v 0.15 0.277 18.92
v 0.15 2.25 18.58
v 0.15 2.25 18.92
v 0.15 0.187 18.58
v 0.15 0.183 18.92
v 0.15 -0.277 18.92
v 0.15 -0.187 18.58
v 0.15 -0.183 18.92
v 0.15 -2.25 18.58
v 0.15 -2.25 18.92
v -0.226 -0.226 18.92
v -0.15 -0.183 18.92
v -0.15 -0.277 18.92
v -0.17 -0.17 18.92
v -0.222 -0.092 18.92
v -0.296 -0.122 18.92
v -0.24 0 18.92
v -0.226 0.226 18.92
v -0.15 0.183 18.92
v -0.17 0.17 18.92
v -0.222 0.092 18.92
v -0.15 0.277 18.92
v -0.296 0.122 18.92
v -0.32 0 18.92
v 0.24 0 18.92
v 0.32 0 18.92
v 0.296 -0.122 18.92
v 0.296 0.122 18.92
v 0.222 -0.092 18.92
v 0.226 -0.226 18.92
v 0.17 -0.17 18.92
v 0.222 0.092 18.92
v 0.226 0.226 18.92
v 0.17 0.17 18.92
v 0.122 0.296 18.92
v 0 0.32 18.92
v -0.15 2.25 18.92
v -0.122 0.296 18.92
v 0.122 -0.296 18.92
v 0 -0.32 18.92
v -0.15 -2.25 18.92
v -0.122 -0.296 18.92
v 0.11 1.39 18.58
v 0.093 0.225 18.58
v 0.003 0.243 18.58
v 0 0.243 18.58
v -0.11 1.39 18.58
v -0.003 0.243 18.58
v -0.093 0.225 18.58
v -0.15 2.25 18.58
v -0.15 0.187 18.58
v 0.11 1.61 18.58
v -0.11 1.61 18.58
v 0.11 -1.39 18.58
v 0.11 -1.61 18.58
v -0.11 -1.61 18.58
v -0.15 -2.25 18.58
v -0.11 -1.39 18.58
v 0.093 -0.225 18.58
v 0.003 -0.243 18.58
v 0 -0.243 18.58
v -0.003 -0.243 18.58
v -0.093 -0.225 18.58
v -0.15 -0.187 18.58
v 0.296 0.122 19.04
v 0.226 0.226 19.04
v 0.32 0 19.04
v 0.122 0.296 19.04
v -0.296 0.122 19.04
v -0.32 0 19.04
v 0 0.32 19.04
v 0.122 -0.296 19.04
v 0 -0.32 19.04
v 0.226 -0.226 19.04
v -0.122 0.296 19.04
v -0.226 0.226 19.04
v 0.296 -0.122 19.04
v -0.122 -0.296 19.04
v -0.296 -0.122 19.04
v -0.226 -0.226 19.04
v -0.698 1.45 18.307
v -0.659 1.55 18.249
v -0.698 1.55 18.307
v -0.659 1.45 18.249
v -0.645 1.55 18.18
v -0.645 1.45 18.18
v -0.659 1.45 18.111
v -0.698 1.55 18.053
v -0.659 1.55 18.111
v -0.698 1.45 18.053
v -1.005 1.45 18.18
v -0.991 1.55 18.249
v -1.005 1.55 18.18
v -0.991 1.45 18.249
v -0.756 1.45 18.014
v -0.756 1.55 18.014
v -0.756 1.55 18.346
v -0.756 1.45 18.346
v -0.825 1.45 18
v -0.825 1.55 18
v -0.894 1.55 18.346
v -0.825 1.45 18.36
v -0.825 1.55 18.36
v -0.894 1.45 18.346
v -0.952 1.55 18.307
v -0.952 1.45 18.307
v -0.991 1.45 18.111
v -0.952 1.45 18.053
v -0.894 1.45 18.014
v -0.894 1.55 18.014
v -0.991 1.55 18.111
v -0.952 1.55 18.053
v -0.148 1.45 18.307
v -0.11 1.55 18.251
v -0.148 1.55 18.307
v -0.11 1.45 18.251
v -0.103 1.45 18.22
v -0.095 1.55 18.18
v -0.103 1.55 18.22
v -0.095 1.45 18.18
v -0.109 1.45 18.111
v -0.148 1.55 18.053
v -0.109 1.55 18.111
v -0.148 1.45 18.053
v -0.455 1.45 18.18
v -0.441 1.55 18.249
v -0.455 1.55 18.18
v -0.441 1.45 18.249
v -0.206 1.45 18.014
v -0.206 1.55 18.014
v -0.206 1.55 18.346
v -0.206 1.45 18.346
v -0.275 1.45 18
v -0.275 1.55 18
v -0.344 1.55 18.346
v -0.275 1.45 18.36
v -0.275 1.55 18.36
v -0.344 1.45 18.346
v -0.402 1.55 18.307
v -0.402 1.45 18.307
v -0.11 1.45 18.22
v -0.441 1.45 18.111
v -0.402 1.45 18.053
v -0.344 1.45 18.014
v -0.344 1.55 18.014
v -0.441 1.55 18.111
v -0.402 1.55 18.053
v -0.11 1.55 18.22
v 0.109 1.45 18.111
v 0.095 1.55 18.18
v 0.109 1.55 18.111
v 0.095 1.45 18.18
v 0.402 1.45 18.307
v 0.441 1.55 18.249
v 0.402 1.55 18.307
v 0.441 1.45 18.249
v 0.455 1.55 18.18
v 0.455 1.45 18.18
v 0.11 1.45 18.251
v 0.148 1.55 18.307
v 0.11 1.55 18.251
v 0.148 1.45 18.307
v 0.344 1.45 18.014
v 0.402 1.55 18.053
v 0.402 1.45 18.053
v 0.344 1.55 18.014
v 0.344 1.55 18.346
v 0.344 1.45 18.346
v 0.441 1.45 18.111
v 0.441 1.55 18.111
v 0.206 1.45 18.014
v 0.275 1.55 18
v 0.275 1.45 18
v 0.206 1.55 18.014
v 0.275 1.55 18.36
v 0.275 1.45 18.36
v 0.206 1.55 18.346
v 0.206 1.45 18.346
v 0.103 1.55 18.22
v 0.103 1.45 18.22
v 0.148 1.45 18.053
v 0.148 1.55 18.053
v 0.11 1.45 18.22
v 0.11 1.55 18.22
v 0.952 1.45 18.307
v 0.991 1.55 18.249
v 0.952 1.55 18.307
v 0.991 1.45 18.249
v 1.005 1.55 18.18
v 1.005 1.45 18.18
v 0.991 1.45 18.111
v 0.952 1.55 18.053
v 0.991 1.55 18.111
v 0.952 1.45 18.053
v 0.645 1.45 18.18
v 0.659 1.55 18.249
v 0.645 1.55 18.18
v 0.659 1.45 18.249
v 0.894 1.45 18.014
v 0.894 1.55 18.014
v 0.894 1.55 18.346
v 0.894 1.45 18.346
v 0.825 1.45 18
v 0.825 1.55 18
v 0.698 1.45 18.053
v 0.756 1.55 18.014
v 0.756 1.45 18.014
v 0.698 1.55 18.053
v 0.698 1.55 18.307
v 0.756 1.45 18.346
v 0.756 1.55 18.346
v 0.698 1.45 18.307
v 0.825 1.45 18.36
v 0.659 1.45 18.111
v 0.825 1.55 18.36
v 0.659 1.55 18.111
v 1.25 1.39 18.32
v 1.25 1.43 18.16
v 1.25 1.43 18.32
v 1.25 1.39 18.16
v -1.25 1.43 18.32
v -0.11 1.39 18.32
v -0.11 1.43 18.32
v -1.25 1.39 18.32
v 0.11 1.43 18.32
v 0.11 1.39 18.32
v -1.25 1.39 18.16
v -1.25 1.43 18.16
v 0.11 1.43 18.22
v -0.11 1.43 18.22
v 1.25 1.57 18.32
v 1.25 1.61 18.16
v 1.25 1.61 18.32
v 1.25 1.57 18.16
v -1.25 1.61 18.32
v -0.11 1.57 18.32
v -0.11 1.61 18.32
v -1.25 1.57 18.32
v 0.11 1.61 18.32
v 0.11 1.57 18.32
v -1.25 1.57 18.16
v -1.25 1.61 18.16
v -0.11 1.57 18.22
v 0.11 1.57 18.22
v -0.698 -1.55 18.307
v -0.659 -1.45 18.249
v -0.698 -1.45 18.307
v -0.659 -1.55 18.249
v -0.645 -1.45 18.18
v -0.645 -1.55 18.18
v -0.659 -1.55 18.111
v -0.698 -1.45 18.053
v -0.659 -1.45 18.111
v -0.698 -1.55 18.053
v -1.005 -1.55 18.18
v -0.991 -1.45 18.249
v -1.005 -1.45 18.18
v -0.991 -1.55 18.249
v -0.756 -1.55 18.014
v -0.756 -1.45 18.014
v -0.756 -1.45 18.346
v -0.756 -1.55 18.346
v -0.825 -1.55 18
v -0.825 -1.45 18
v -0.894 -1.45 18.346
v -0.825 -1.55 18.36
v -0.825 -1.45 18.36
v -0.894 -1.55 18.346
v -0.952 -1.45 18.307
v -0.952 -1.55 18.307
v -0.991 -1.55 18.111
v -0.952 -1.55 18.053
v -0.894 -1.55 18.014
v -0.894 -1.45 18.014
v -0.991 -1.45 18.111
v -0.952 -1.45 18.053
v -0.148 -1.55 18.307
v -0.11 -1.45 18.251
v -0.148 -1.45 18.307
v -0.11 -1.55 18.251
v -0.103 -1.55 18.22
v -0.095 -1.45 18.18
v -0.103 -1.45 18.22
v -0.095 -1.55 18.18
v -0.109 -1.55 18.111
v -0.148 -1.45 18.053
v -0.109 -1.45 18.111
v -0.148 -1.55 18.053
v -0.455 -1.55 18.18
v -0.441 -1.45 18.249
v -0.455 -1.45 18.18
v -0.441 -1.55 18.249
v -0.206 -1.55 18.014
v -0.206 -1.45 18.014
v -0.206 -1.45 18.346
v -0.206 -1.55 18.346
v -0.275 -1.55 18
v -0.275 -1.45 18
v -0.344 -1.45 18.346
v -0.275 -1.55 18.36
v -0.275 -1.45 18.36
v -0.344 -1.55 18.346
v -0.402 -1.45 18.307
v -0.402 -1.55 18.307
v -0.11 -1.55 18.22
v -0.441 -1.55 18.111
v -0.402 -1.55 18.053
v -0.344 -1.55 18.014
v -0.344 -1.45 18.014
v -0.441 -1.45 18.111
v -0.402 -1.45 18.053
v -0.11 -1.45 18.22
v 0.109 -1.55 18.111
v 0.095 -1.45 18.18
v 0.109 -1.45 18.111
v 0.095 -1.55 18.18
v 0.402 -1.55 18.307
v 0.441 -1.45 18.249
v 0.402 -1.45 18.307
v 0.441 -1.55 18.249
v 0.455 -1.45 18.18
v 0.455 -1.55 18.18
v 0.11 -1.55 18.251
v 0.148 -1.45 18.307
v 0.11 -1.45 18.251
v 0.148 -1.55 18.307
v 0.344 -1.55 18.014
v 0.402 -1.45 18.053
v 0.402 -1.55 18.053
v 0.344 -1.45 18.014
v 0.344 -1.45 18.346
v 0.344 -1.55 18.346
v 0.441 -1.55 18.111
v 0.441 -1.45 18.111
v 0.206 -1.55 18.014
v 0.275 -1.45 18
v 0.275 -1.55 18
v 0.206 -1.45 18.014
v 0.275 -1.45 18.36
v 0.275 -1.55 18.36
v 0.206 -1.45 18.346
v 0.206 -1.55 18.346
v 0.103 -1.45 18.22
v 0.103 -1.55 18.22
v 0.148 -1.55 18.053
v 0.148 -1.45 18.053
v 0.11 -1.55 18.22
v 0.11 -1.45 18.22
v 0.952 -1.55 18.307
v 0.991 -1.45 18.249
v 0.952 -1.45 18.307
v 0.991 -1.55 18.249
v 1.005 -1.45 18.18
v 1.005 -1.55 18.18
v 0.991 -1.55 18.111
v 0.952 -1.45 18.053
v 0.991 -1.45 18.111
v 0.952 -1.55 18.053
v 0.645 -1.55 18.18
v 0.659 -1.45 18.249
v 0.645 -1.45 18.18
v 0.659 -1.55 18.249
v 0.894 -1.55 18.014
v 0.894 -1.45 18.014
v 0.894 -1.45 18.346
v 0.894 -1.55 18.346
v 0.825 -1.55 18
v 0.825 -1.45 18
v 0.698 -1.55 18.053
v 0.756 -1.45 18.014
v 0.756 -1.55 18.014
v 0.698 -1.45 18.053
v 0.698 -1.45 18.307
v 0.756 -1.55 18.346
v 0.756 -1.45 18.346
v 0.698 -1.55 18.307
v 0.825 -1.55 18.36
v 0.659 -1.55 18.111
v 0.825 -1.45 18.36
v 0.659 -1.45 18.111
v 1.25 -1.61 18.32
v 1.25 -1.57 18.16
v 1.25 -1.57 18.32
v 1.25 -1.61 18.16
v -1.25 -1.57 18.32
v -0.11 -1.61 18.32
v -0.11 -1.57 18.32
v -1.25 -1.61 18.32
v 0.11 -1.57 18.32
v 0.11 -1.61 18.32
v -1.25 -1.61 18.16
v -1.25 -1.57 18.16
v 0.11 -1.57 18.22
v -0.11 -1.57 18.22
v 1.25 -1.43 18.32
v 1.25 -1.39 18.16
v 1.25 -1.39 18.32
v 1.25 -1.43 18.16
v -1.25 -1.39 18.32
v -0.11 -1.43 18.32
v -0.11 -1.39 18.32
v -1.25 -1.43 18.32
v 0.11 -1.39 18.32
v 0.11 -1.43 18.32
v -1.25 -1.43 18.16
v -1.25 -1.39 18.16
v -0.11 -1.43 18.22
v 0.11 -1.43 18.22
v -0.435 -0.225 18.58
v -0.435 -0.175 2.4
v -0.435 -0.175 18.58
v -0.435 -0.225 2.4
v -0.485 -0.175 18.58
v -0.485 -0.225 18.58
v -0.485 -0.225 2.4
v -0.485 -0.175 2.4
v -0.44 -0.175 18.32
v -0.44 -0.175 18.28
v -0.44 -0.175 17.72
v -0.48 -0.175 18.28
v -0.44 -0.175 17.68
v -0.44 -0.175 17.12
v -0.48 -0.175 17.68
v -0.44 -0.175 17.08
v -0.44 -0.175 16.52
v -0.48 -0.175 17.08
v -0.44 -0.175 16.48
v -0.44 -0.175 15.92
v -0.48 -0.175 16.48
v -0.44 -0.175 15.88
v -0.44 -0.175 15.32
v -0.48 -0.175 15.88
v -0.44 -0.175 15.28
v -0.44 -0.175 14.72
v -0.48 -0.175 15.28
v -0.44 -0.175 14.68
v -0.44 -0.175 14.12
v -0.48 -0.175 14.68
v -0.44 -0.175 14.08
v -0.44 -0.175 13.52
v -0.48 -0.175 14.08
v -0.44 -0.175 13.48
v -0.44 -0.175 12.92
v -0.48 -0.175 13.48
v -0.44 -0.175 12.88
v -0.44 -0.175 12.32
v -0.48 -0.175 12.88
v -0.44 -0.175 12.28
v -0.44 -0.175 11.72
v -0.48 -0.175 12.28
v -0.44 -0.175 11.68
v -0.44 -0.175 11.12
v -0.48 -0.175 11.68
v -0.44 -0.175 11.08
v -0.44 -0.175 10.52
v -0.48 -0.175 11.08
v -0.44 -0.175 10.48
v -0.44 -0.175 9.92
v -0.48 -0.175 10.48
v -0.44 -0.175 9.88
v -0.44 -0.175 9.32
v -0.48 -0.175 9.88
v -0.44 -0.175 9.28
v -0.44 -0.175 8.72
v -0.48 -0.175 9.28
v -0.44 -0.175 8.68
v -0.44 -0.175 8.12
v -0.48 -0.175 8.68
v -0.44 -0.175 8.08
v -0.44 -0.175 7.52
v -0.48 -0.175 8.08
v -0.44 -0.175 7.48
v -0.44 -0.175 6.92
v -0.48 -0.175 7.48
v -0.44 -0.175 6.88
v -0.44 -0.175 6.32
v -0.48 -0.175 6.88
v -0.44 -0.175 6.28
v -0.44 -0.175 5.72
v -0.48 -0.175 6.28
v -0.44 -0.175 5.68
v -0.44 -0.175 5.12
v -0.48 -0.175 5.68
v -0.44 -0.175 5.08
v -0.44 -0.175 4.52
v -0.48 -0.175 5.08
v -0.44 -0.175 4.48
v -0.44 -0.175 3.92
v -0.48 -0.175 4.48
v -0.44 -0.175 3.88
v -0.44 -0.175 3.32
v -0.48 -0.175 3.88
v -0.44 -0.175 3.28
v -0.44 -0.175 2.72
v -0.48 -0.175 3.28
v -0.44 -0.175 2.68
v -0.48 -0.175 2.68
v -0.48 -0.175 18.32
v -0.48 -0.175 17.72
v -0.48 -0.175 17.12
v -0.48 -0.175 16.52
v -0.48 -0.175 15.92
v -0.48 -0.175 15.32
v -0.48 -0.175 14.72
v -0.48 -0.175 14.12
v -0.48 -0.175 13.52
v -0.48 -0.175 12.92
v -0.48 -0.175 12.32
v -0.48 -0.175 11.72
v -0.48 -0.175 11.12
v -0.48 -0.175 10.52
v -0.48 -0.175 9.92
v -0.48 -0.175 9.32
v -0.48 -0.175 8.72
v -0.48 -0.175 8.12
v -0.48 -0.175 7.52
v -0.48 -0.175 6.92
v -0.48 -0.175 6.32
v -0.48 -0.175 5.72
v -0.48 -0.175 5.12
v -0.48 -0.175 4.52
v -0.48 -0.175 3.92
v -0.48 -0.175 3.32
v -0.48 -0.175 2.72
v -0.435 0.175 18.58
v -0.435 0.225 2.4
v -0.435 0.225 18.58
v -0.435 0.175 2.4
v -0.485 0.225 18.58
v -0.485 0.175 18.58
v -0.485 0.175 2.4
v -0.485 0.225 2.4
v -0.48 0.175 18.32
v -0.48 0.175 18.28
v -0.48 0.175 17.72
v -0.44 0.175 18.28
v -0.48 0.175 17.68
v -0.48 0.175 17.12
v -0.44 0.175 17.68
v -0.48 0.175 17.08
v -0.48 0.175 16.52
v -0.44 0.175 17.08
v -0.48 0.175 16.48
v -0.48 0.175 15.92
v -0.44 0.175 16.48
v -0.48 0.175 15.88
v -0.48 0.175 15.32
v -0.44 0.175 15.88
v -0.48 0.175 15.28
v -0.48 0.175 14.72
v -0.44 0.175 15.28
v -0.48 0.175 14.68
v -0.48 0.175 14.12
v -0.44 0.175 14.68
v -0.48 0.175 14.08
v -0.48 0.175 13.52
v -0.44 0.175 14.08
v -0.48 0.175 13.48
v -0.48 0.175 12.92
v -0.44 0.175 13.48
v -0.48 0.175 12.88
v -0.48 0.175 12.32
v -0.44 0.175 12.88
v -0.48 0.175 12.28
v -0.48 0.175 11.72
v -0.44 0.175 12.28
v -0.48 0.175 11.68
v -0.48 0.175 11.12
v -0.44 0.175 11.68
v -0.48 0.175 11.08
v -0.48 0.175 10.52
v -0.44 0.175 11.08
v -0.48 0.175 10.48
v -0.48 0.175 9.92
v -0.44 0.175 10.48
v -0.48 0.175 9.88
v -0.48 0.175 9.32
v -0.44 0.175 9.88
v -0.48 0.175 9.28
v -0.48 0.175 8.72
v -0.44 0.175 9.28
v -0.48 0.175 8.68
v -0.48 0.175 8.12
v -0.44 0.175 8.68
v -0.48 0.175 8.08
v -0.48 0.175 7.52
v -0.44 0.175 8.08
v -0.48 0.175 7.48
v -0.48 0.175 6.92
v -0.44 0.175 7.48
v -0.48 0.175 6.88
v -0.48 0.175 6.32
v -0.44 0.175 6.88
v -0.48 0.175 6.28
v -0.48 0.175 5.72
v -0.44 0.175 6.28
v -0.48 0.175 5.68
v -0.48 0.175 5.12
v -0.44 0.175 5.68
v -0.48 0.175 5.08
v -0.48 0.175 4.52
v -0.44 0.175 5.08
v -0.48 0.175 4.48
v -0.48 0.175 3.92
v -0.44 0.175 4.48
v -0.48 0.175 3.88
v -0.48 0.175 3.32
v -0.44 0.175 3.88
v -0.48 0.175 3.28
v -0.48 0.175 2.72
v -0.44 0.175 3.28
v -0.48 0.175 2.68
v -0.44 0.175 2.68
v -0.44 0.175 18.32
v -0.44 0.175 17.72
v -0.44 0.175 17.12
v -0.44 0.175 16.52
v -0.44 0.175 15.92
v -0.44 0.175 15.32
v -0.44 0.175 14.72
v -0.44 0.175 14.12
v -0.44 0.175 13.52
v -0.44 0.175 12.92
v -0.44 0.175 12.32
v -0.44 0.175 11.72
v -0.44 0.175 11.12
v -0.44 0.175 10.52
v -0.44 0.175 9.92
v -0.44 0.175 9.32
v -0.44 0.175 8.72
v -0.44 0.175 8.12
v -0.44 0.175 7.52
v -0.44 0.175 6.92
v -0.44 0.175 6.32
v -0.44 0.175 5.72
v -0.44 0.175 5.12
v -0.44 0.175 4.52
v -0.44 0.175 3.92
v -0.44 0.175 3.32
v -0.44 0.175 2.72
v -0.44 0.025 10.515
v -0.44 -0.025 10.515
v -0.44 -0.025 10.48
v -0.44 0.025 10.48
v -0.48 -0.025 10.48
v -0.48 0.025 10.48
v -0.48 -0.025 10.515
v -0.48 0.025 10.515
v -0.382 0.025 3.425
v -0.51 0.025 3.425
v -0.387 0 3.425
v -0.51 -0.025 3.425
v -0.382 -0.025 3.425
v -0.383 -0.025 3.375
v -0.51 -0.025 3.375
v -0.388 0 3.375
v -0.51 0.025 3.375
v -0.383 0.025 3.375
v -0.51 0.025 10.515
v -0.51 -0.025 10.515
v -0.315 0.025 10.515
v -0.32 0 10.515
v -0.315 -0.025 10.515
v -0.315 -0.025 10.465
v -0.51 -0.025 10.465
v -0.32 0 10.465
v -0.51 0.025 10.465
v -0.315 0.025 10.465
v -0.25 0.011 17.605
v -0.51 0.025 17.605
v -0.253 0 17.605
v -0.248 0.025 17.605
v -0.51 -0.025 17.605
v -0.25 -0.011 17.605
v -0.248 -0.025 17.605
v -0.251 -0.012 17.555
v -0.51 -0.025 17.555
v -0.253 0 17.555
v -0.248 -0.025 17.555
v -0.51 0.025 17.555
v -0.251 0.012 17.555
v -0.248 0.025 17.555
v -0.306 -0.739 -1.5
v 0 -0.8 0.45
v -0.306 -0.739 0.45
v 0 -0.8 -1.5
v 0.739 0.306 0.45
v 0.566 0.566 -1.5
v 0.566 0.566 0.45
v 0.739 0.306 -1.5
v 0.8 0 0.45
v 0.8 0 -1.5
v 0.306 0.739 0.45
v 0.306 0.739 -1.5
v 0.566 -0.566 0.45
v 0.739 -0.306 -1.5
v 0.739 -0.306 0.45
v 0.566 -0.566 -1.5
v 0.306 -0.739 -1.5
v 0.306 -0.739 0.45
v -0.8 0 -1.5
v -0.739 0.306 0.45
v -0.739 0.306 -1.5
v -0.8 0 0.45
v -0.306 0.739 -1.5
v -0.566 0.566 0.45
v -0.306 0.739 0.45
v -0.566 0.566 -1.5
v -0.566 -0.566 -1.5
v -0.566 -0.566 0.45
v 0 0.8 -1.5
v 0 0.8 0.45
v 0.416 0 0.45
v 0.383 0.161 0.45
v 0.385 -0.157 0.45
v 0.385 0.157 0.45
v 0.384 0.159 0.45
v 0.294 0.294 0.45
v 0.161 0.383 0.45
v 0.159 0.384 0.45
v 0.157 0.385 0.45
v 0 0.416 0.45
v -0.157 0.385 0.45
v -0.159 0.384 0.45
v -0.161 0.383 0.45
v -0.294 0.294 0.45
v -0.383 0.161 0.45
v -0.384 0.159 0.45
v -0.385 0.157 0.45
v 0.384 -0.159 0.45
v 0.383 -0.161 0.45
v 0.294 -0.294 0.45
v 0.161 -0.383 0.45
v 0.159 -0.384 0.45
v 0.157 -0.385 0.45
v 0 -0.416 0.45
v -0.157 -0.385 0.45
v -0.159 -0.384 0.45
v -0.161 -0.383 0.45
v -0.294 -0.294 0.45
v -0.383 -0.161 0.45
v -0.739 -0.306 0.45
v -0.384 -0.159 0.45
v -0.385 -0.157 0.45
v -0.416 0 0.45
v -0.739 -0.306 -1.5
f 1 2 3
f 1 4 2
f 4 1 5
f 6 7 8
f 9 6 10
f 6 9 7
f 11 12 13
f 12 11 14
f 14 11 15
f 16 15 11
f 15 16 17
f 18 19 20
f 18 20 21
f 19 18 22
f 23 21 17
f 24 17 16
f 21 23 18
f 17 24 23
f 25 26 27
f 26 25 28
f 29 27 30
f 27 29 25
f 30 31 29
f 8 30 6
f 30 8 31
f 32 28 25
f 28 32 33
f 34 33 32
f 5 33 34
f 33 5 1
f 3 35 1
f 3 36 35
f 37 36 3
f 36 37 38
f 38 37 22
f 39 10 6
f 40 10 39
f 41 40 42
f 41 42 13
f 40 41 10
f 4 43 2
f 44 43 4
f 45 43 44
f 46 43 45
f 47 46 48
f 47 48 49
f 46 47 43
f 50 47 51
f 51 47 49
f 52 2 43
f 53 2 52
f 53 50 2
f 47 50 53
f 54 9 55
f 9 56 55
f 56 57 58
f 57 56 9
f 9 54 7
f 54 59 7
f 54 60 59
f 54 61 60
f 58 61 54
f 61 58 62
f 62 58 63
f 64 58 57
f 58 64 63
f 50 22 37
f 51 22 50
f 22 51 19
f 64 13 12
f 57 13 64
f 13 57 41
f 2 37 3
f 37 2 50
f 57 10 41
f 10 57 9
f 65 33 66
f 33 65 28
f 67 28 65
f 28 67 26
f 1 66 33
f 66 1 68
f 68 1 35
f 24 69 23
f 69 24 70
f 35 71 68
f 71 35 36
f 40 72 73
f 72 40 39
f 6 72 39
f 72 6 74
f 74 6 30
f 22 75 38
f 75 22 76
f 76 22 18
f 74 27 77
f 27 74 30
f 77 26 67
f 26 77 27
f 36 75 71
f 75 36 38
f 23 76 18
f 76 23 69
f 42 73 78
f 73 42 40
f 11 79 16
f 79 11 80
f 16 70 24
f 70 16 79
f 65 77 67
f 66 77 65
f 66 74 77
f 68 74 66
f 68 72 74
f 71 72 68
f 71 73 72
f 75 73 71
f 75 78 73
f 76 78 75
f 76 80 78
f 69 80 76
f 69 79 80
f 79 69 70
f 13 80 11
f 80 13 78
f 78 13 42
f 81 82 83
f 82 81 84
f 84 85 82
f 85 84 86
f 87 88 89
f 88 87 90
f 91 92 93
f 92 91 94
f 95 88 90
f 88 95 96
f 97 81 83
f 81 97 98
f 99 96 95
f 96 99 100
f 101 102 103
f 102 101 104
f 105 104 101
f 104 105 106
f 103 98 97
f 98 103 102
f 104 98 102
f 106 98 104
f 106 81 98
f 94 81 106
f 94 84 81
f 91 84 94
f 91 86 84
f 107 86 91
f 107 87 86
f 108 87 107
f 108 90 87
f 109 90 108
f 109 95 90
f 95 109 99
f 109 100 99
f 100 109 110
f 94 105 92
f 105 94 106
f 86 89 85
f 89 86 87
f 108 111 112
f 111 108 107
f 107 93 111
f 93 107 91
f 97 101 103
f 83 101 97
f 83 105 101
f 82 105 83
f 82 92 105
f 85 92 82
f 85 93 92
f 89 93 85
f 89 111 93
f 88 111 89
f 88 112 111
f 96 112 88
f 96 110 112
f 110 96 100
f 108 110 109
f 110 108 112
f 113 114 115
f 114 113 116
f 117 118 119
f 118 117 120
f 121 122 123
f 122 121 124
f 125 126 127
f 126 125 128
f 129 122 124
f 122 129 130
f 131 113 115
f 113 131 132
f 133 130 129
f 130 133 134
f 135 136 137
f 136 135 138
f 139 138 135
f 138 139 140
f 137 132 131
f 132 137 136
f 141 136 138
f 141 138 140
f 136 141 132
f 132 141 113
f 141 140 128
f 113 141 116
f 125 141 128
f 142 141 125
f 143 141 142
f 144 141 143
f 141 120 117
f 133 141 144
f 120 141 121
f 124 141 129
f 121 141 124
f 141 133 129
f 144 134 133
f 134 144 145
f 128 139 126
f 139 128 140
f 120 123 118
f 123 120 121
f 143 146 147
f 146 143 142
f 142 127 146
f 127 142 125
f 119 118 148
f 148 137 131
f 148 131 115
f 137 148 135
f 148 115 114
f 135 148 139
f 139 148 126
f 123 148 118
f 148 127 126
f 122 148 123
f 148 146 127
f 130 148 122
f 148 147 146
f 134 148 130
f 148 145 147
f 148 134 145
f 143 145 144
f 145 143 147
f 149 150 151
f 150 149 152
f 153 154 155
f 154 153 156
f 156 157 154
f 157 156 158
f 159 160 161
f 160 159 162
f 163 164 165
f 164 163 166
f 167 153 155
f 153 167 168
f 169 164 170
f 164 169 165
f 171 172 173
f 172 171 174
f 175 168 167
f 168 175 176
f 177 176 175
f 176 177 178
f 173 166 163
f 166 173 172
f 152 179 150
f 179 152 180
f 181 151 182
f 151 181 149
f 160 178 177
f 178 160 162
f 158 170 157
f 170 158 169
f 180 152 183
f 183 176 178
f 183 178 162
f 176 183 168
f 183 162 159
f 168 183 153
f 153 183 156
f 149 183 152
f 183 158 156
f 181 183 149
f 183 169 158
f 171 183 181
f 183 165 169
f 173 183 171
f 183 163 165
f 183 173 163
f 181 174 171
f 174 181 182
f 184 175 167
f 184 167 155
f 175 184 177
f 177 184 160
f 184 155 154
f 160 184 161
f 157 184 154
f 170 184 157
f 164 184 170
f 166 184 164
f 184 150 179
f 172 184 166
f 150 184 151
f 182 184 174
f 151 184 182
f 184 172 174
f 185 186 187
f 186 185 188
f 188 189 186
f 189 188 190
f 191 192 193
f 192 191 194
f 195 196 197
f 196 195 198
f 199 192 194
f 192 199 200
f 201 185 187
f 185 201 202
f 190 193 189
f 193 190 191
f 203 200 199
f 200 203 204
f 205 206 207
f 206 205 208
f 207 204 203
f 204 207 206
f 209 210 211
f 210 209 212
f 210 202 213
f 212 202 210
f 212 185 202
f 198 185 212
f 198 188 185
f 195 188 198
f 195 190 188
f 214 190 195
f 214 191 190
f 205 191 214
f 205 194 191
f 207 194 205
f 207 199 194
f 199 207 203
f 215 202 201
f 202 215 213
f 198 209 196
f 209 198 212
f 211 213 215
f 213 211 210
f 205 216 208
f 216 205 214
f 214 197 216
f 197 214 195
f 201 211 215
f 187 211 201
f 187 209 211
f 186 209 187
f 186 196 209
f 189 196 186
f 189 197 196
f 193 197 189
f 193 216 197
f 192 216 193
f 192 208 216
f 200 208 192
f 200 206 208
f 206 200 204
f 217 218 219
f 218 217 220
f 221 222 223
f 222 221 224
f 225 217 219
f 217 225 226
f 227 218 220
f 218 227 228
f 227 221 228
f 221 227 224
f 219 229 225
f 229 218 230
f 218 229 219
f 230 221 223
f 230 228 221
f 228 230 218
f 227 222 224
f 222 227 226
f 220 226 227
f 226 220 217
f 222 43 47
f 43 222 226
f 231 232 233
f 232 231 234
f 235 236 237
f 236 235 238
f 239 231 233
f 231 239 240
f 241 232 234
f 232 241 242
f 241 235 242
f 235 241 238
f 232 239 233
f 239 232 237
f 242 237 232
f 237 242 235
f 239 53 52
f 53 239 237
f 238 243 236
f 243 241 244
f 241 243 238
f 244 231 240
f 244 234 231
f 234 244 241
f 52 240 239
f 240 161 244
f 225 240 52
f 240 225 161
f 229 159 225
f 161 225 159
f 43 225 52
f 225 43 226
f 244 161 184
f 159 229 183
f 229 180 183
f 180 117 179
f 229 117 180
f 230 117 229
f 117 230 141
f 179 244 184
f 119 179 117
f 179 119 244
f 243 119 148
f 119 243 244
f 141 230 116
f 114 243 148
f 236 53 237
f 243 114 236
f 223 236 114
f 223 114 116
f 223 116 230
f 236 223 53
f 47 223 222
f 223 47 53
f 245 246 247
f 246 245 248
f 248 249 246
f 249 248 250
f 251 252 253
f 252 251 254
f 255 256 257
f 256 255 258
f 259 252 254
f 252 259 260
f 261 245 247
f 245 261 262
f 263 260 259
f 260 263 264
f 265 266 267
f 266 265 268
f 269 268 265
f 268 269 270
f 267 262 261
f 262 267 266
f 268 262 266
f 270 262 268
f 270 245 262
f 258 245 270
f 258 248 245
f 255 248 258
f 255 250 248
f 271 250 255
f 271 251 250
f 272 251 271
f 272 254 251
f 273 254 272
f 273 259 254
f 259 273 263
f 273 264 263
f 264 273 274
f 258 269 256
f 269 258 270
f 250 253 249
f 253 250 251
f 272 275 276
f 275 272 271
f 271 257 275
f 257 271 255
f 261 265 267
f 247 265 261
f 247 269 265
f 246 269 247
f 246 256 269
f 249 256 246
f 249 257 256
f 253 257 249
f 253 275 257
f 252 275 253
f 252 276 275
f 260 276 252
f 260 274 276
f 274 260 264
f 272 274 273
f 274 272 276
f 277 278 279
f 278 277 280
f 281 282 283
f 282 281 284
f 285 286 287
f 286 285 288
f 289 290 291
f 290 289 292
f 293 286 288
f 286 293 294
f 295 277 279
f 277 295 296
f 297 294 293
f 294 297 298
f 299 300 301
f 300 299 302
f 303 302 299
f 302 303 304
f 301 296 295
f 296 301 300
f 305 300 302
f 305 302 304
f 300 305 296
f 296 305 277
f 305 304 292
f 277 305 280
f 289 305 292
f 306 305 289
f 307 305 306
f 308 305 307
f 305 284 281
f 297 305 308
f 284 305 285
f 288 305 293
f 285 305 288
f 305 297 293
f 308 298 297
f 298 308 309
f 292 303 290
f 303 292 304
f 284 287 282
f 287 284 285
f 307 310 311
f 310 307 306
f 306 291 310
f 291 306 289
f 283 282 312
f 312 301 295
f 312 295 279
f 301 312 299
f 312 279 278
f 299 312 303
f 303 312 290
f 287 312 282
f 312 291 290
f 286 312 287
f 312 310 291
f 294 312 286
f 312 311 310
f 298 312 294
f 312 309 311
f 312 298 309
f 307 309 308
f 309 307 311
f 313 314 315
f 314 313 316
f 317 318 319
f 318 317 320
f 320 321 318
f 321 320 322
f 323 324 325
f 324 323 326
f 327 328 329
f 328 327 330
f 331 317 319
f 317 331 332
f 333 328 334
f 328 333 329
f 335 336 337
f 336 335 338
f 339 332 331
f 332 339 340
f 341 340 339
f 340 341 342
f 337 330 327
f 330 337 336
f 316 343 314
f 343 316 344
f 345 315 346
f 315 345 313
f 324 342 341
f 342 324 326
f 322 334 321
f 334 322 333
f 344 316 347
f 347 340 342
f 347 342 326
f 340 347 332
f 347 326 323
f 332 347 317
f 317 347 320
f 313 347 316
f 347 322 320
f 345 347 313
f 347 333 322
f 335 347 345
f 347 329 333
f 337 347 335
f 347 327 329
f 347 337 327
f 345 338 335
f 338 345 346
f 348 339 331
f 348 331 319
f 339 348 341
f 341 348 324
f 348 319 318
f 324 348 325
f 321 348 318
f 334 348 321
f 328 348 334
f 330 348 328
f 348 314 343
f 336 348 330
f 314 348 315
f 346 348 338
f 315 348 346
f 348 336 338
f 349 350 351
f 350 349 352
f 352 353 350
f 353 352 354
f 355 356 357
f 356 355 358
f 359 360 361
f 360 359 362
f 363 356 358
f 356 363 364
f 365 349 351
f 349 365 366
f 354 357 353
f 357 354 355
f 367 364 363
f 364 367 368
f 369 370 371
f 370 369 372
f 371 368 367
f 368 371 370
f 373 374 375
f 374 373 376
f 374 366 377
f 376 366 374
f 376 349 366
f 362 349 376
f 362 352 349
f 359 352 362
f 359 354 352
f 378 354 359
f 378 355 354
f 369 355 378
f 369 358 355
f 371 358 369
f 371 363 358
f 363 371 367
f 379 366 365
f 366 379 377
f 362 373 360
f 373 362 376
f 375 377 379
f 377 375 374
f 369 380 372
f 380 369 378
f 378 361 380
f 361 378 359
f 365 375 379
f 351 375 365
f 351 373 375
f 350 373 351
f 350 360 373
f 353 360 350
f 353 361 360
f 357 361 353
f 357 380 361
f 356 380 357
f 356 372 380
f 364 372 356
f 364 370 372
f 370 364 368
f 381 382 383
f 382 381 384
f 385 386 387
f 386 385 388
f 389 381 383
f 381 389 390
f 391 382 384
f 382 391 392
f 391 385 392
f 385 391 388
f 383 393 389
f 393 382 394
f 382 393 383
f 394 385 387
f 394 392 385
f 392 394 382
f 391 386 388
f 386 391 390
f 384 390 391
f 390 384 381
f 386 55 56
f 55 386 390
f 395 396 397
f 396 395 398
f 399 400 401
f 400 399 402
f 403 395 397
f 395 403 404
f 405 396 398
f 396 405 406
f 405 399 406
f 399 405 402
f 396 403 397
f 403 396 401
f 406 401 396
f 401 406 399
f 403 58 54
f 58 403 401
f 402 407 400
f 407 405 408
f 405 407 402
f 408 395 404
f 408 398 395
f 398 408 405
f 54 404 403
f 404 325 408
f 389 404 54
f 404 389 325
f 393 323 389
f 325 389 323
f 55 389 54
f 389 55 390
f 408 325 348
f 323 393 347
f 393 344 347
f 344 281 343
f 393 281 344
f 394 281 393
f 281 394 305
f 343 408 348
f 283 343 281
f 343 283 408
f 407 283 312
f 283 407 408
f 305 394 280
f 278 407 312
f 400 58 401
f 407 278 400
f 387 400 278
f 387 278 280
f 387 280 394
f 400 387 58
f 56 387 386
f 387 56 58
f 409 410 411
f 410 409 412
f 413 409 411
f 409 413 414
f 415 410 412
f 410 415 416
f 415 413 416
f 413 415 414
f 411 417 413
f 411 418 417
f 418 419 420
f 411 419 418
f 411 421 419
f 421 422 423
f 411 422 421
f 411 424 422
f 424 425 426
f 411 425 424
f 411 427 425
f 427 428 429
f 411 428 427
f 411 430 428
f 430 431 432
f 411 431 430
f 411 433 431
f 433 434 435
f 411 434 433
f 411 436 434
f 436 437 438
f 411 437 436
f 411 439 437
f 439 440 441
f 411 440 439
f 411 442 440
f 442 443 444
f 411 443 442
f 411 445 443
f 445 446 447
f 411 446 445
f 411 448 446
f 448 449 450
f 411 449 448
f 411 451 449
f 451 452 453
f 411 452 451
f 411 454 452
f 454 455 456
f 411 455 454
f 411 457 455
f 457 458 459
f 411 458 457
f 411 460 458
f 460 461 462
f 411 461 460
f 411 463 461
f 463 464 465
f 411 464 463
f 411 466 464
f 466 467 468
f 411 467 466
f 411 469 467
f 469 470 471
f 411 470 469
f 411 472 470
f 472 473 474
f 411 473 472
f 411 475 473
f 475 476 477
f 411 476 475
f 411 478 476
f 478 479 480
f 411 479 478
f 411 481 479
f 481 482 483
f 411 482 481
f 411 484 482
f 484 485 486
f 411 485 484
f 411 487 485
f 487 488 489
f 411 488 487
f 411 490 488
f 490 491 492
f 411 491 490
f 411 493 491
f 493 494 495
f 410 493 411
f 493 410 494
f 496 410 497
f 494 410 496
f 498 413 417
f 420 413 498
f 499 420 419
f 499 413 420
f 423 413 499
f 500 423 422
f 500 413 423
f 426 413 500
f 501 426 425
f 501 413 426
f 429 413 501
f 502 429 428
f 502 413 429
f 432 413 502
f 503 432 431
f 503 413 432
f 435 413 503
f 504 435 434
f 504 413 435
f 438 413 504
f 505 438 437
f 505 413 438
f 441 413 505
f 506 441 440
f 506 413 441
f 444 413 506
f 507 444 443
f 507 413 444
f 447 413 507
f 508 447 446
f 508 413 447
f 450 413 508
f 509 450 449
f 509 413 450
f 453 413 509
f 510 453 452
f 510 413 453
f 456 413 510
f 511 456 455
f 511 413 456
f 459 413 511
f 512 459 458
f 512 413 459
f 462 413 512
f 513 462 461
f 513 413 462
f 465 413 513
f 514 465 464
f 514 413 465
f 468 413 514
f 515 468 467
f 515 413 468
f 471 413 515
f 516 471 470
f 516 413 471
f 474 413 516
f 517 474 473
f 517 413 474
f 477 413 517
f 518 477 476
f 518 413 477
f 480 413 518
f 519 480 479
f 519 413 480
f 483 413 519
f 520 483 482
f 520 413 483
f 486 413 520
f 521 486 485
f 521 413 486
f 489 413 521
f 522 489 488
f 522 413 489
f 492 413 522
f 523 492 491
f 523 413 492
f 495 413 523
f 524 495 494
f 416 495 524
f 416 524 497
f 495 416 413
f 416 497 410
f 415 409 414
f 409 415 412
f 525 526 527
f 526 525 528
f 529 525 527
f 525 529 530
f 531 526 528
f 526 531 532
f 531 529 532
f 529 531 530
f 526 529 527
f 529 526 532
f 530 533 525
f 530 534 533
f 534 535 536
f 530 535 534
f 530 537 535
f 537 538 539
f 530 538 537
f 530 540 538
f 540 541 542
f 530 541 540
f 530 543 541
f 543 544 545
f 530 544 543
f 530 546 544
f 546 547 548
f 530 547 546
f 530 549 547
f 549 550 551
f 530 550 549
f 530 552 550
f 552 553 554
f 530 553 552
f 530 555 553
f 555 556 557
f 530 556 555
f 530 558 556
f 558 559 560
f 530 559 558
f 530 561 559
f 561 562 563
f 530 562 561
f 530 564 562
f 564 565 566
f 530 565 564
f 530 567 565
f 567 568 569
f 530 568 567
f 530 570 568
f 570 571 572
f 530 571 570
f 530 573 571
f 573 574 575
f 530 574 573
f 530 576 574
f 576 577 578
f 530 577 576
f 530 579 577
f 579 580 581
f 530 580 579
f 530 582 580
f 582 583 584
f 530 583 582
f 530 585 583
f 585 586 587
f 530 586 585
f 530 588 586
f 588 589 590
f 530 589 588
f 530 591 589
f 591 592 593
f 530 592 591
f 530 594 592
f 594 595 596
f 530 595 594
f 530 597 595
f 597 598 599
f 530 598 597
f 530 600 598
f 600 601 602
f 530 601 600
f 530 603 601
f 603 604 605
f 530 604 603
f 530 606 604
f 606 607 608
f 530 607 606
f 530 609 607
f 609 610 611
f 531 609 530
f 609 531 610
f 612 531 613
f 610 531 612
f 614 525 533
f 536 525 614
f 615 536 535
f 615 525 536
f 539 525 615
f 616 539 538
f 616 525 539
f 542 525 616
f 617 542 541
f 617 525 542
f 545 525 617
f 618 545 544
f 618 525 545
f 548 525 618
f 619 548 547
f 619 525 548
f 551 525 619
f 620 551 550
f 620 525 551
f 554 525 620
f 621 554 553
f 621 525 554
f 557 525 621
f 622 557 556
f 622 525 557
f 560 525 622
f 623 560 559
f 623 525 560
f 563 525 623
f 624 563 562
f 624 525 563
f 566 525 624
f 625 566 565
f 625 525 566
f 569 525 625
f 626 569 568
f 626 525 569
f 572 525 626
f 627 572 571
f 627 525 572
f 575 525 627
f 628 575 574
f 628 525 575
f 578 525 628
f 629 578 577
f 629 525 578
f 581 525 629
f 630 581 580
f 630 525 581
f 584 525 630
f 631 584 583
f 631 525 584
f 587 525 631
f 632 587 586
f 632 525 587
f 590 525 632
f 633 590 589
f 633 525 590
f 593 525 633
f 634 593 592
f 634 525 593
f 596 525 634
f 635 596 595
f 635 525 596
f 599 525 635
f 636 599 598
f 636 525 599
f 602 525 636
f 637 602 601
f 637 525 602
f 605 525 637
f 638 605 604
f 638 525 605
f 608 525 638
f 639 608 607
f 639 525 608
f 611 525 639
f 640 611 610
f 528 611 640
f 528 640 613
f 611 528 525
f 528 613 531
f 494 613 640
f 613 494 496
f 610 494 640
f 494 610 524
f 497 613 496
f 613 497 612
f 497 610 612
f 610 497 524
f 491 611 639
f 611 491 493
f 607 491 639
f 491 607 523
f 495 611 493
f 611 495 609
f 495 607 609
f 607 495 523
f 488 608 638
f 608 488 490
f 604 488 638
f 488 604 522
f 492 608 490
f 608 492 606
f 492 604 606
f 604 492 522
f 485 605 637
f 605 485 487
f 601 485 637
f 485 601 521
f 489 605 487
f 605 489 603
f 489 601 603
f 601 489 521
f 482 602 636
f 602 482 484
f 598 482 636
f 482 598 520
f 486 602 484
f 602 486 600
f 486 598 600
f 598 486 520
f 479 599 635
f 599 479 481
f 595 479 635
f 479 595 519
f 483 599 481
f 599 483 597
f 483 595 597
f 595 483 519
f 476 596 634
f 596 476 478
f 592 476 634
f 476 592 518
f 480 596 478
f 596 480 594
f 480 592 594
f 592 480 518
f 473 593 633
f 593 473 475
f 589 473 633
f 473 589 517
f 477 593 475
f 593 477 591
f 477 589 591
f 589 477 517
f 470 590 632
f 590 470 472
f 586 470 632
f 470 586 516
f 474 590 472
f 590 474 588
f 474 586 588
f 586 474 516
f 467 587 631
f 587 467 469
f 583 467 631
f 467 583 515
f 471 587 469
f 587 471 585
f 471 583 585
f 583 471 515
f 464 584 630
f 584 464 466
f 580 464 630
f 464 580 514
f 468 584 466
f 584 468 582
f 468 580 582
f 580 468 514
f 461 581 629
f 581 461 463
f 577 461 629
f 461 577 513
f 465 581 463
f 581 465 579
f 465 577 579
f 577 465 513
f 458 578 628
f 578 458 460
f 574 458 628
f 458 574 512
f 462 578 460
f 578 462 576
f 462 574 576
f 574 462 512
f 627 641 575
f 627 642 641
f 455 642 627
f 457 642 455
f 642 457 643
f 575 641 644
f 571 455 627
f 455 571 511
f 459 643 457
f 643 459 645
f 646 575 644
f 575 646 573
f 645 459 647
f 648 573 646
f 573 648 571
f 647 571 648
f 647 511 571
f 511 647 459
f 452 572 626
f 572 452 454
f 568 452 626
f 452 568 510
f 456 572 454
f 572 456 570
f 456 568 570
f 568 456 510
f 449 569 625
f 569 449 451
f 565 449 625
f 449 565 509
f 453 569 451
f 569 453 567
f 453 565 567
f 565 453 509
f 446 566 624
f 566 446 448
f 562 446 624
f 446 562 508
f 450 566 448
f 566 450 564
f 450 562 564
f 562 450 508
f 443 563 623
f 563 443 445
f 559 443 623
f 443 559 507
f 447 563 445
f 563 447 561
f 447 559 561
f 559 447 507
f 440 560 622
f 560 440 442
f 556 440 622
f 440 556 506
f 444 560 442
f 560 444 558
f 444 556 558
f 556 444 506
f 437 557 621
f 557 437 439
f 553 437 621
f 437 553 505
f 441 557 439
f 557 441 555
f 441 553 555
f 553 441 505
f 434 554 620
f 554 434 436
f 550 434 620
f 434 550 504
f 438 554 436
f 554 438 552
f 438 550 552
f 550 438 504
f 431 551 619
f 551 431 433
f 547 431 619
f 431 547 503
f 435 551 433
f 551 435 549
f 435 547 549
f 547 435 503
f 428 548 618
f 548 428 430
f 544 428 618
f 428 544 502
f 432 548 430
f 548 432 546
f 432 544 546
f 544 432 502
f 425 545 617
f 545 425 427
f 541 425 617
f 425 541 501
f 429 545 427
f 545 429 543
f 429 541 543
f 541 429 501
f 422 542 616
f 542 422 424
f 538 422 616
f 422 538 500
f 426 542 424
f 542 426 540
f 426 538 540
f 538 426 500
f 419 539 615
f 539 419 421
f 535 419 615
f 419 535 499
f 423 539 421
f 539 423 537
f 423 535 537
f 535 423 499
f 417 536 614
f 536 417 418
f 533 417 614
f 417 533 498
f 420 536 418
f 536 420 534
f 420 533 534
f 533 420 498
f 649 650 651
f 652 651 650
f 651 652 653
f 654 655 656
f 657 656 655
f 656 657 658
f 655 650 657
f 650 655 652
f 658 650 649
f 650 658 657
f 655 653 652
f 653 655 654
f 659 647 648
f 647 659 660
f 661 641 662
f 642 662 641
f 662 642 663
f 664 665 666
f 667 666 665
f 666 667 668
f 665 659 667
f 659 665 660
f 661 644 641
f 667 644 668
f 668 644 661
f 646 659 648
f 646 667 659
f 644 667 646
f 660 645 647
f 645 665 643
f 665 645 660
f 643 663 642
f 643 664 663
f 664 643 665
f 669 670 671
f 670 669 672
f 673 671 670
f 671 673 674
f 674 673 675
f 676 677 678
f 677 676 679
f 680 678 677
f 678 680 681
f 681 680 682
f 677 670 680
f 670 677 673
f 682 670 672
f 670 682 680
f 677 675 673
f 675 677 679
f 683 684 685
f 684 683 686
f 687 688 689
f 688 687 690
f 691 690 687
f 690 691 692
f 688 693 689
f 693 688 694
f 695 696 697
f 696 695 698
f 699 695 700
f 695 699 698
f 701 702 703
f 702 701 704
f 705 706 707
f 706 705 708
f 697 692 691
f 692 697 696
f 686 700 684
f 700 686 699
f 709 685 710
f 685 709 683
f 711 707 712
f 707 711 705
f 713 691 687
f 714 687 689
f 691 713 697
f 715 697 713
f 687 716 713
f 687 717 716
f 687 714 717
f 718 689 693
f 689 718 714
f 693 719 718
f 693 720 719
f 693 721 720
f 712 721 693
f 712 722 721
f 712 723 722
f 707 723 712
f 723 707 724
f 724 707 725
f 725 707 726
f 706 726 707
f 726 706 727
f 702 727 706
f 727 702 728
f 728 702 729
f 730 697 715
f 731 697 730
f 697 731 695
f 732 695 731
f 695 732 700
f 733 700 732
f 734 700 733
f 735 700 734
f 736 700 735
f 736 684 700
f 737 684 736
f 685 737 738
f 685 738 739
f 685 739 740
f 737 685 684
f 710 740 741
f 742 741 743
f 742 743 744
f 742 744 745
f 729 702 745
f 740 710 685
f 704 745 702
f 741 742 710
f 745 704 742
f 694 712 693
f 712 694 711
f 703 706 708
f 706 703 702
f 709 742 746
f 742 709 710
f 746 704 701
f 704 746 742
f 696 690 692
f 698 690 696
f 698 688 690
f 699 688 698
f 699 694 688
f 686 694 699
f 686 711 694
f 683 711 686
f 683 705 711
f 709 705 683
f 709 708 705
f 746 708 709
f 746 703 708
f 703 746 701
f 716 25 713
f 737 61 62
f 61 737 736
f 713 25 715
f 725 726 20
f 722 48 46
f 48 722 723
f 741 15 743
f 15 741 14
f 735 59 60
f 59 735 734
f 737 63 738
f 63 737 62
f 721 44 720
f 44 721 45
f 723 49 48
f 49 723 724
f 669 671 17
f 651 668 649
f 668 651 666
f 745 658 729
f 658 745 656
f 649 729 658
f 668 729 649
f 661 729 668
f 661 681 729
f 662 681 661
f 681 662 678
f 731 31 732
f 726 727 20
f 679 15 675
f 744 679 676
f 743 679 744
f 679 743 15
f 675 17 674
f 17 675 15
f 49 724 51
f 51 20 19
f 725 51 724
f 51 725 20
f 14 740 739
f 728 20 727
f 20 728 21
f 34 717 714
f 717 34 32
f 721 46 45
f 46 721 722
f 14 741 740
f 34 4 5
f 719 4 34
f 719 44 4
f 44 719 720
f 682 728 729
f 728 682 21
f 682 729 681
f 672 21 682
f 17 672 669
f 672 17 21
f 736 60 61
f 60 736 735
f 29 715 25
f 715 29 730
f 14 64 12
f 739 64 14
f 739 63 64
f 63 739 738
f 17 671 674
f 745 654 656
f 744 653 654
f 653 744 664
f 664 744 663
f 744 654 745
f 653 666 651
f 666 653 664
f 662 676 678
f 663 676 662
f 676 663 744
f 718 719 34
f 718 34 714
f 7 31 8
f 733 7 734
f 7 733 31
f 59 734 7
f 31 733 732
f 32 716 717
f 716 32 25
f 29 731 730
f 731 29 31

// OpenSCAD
// Lift tower — chairlift tower. A tapered round steel pole on a concrete
// footing, a crossarm across the top, and a sheave train at each end
// carrying the cable, with a maintenance ladder up the back of the pole.
// Conventions, units, and axis docs: see models-src/README.md.
//
// The cable crosses the tower at cable_h (world.TowerHeight), cable_gap
// either side of the pole (world.CableGap). Chairs hang from the cable
// down to about 1.9 m below it and a quad's reaches to 0.3 m off the
// centreline, so the crossarm sits above the cable, the sheave wheels
// hang from it with the cable running along their undersides, and the
// pole narrows to clear the chairs' inner edge.

$fn = 16;

// ── Dimensions (metres) ────────────────────────────────────────────────
cable_h   = 18.00; // world.TowerHeight
cable_gap = 1.50;  // world.CableGap

pole_r0   = 0.42;  // at the ground
pole_r1   = 0.24;  // at the crossarm
footing_r = 0.80;
footing_h = 0.45;  // above ground; it carries on below for sloped ground

sheave_r  = 0.18;
sheave_t  = 0.10;
sheaves   = 4;     // per train
sheave_dx = 0.55;  // spacing along the cable
train_len = sheaves * sheave_dx + 0.3;

arm_z     = cable_h + 2 * sheave_r + 0.22; // crossarm underside
arm_h     = 0.34;
arm_w     = 0.30;  // along the cable
arm_half  = cable_gap + 0.75;

ladder_x  = -(pole_r1 + 0.22); // up the back of the pole
ladder_w  = 0.40;
ladder_z0 = 2.4;               // out of reach from the ground
rung_dz   = 0.6;

// ── Geometry ───────────────────────────────────────────────────────────
module footing() {
    color("Silver")
        translate([0, 0, -1.5])
            cylinder(h = 1.5 + footing_h, r = footing_r);
}

module pole() {
    color("SlateGray")
        cylinder(h = arm_z + arm_h, r1 = pole_r0, r2 = pole_r1);
}

module crossarm() {
    color("SlateGray")
        translate([0, 0, arm_z + arm_h / 2])
            cube([arm_w, 2 * arm_half, arm_h], center = true);
    // A cap over the pole head.
    color("DimGray")
        translate([0, 0, arm_z + arm_h])
            cylinder(h = 0.12, r = pole_r1 + 0.08);
}

// A sheave train: wheels in a row along the cable, their bottoms on the
// cable, in a frame hung from the crossarm.
module sheave_train(y) {
    wheel_z = cable_h + sheave_r;
    color("DarkSlateGray")
        for (i = [0 : sheaves - 1])
            translate([(i - (sheaves - 1) / 2) * sheave_dx, y, wheel_z])
                rotate([90, 0, 0])
                    cylinder(h = sheave_t, r = sheave_r, center = true);
    // Side plates over the axles, and the hanger to the crossarm.
    color("Goldenrod") {
        for (s = [-1, 1])
            translate([0, y + s * (sheave_t / 2 + 0.04), wheel_z + 0.06])
                cube([train_len, 0.04, 0.16], center = true);
        translate([0, y, (wheel_z + arm_z) / 2 + 0.04])
            cube([0.22, 0.22, arm_z - wheel_z], center = true);
    }
}

module ladder() {
    color("DimGray") {
        for (s = [-1, 1])
            translate([ladder_x, s * ladder_w / 2, (ladder_z0 + arm_z) / 2])
                cube([0.05, 0.05, arm_z - ladder_z0], center = true);
        for (z = [ladder_z0 + 0.3 : rung_dz : arm_z - 0.2])
            translate([ladder_x, 0, z])
                cube([0.04, ladder_w, 0.04], center = true);
        // Stand-offs tying the rails to the pole.
        for (z = [ladder_z0 + 1, (ladder_z0 + arm_z) / 2, arm_z - 1])
            translate([(ladder_x - pole_r1) / 2, 0, z])
                cube([abs(ladder_x) - pole_r1 + 0.1, 0.05, 0.05], center = true);
    }
}

module tower() {
    footing();
    pole();
    crossarm();
    sheave_train(cable_gap);
    sheave_train(-cable_gap);
    ladder();
}

tower();
